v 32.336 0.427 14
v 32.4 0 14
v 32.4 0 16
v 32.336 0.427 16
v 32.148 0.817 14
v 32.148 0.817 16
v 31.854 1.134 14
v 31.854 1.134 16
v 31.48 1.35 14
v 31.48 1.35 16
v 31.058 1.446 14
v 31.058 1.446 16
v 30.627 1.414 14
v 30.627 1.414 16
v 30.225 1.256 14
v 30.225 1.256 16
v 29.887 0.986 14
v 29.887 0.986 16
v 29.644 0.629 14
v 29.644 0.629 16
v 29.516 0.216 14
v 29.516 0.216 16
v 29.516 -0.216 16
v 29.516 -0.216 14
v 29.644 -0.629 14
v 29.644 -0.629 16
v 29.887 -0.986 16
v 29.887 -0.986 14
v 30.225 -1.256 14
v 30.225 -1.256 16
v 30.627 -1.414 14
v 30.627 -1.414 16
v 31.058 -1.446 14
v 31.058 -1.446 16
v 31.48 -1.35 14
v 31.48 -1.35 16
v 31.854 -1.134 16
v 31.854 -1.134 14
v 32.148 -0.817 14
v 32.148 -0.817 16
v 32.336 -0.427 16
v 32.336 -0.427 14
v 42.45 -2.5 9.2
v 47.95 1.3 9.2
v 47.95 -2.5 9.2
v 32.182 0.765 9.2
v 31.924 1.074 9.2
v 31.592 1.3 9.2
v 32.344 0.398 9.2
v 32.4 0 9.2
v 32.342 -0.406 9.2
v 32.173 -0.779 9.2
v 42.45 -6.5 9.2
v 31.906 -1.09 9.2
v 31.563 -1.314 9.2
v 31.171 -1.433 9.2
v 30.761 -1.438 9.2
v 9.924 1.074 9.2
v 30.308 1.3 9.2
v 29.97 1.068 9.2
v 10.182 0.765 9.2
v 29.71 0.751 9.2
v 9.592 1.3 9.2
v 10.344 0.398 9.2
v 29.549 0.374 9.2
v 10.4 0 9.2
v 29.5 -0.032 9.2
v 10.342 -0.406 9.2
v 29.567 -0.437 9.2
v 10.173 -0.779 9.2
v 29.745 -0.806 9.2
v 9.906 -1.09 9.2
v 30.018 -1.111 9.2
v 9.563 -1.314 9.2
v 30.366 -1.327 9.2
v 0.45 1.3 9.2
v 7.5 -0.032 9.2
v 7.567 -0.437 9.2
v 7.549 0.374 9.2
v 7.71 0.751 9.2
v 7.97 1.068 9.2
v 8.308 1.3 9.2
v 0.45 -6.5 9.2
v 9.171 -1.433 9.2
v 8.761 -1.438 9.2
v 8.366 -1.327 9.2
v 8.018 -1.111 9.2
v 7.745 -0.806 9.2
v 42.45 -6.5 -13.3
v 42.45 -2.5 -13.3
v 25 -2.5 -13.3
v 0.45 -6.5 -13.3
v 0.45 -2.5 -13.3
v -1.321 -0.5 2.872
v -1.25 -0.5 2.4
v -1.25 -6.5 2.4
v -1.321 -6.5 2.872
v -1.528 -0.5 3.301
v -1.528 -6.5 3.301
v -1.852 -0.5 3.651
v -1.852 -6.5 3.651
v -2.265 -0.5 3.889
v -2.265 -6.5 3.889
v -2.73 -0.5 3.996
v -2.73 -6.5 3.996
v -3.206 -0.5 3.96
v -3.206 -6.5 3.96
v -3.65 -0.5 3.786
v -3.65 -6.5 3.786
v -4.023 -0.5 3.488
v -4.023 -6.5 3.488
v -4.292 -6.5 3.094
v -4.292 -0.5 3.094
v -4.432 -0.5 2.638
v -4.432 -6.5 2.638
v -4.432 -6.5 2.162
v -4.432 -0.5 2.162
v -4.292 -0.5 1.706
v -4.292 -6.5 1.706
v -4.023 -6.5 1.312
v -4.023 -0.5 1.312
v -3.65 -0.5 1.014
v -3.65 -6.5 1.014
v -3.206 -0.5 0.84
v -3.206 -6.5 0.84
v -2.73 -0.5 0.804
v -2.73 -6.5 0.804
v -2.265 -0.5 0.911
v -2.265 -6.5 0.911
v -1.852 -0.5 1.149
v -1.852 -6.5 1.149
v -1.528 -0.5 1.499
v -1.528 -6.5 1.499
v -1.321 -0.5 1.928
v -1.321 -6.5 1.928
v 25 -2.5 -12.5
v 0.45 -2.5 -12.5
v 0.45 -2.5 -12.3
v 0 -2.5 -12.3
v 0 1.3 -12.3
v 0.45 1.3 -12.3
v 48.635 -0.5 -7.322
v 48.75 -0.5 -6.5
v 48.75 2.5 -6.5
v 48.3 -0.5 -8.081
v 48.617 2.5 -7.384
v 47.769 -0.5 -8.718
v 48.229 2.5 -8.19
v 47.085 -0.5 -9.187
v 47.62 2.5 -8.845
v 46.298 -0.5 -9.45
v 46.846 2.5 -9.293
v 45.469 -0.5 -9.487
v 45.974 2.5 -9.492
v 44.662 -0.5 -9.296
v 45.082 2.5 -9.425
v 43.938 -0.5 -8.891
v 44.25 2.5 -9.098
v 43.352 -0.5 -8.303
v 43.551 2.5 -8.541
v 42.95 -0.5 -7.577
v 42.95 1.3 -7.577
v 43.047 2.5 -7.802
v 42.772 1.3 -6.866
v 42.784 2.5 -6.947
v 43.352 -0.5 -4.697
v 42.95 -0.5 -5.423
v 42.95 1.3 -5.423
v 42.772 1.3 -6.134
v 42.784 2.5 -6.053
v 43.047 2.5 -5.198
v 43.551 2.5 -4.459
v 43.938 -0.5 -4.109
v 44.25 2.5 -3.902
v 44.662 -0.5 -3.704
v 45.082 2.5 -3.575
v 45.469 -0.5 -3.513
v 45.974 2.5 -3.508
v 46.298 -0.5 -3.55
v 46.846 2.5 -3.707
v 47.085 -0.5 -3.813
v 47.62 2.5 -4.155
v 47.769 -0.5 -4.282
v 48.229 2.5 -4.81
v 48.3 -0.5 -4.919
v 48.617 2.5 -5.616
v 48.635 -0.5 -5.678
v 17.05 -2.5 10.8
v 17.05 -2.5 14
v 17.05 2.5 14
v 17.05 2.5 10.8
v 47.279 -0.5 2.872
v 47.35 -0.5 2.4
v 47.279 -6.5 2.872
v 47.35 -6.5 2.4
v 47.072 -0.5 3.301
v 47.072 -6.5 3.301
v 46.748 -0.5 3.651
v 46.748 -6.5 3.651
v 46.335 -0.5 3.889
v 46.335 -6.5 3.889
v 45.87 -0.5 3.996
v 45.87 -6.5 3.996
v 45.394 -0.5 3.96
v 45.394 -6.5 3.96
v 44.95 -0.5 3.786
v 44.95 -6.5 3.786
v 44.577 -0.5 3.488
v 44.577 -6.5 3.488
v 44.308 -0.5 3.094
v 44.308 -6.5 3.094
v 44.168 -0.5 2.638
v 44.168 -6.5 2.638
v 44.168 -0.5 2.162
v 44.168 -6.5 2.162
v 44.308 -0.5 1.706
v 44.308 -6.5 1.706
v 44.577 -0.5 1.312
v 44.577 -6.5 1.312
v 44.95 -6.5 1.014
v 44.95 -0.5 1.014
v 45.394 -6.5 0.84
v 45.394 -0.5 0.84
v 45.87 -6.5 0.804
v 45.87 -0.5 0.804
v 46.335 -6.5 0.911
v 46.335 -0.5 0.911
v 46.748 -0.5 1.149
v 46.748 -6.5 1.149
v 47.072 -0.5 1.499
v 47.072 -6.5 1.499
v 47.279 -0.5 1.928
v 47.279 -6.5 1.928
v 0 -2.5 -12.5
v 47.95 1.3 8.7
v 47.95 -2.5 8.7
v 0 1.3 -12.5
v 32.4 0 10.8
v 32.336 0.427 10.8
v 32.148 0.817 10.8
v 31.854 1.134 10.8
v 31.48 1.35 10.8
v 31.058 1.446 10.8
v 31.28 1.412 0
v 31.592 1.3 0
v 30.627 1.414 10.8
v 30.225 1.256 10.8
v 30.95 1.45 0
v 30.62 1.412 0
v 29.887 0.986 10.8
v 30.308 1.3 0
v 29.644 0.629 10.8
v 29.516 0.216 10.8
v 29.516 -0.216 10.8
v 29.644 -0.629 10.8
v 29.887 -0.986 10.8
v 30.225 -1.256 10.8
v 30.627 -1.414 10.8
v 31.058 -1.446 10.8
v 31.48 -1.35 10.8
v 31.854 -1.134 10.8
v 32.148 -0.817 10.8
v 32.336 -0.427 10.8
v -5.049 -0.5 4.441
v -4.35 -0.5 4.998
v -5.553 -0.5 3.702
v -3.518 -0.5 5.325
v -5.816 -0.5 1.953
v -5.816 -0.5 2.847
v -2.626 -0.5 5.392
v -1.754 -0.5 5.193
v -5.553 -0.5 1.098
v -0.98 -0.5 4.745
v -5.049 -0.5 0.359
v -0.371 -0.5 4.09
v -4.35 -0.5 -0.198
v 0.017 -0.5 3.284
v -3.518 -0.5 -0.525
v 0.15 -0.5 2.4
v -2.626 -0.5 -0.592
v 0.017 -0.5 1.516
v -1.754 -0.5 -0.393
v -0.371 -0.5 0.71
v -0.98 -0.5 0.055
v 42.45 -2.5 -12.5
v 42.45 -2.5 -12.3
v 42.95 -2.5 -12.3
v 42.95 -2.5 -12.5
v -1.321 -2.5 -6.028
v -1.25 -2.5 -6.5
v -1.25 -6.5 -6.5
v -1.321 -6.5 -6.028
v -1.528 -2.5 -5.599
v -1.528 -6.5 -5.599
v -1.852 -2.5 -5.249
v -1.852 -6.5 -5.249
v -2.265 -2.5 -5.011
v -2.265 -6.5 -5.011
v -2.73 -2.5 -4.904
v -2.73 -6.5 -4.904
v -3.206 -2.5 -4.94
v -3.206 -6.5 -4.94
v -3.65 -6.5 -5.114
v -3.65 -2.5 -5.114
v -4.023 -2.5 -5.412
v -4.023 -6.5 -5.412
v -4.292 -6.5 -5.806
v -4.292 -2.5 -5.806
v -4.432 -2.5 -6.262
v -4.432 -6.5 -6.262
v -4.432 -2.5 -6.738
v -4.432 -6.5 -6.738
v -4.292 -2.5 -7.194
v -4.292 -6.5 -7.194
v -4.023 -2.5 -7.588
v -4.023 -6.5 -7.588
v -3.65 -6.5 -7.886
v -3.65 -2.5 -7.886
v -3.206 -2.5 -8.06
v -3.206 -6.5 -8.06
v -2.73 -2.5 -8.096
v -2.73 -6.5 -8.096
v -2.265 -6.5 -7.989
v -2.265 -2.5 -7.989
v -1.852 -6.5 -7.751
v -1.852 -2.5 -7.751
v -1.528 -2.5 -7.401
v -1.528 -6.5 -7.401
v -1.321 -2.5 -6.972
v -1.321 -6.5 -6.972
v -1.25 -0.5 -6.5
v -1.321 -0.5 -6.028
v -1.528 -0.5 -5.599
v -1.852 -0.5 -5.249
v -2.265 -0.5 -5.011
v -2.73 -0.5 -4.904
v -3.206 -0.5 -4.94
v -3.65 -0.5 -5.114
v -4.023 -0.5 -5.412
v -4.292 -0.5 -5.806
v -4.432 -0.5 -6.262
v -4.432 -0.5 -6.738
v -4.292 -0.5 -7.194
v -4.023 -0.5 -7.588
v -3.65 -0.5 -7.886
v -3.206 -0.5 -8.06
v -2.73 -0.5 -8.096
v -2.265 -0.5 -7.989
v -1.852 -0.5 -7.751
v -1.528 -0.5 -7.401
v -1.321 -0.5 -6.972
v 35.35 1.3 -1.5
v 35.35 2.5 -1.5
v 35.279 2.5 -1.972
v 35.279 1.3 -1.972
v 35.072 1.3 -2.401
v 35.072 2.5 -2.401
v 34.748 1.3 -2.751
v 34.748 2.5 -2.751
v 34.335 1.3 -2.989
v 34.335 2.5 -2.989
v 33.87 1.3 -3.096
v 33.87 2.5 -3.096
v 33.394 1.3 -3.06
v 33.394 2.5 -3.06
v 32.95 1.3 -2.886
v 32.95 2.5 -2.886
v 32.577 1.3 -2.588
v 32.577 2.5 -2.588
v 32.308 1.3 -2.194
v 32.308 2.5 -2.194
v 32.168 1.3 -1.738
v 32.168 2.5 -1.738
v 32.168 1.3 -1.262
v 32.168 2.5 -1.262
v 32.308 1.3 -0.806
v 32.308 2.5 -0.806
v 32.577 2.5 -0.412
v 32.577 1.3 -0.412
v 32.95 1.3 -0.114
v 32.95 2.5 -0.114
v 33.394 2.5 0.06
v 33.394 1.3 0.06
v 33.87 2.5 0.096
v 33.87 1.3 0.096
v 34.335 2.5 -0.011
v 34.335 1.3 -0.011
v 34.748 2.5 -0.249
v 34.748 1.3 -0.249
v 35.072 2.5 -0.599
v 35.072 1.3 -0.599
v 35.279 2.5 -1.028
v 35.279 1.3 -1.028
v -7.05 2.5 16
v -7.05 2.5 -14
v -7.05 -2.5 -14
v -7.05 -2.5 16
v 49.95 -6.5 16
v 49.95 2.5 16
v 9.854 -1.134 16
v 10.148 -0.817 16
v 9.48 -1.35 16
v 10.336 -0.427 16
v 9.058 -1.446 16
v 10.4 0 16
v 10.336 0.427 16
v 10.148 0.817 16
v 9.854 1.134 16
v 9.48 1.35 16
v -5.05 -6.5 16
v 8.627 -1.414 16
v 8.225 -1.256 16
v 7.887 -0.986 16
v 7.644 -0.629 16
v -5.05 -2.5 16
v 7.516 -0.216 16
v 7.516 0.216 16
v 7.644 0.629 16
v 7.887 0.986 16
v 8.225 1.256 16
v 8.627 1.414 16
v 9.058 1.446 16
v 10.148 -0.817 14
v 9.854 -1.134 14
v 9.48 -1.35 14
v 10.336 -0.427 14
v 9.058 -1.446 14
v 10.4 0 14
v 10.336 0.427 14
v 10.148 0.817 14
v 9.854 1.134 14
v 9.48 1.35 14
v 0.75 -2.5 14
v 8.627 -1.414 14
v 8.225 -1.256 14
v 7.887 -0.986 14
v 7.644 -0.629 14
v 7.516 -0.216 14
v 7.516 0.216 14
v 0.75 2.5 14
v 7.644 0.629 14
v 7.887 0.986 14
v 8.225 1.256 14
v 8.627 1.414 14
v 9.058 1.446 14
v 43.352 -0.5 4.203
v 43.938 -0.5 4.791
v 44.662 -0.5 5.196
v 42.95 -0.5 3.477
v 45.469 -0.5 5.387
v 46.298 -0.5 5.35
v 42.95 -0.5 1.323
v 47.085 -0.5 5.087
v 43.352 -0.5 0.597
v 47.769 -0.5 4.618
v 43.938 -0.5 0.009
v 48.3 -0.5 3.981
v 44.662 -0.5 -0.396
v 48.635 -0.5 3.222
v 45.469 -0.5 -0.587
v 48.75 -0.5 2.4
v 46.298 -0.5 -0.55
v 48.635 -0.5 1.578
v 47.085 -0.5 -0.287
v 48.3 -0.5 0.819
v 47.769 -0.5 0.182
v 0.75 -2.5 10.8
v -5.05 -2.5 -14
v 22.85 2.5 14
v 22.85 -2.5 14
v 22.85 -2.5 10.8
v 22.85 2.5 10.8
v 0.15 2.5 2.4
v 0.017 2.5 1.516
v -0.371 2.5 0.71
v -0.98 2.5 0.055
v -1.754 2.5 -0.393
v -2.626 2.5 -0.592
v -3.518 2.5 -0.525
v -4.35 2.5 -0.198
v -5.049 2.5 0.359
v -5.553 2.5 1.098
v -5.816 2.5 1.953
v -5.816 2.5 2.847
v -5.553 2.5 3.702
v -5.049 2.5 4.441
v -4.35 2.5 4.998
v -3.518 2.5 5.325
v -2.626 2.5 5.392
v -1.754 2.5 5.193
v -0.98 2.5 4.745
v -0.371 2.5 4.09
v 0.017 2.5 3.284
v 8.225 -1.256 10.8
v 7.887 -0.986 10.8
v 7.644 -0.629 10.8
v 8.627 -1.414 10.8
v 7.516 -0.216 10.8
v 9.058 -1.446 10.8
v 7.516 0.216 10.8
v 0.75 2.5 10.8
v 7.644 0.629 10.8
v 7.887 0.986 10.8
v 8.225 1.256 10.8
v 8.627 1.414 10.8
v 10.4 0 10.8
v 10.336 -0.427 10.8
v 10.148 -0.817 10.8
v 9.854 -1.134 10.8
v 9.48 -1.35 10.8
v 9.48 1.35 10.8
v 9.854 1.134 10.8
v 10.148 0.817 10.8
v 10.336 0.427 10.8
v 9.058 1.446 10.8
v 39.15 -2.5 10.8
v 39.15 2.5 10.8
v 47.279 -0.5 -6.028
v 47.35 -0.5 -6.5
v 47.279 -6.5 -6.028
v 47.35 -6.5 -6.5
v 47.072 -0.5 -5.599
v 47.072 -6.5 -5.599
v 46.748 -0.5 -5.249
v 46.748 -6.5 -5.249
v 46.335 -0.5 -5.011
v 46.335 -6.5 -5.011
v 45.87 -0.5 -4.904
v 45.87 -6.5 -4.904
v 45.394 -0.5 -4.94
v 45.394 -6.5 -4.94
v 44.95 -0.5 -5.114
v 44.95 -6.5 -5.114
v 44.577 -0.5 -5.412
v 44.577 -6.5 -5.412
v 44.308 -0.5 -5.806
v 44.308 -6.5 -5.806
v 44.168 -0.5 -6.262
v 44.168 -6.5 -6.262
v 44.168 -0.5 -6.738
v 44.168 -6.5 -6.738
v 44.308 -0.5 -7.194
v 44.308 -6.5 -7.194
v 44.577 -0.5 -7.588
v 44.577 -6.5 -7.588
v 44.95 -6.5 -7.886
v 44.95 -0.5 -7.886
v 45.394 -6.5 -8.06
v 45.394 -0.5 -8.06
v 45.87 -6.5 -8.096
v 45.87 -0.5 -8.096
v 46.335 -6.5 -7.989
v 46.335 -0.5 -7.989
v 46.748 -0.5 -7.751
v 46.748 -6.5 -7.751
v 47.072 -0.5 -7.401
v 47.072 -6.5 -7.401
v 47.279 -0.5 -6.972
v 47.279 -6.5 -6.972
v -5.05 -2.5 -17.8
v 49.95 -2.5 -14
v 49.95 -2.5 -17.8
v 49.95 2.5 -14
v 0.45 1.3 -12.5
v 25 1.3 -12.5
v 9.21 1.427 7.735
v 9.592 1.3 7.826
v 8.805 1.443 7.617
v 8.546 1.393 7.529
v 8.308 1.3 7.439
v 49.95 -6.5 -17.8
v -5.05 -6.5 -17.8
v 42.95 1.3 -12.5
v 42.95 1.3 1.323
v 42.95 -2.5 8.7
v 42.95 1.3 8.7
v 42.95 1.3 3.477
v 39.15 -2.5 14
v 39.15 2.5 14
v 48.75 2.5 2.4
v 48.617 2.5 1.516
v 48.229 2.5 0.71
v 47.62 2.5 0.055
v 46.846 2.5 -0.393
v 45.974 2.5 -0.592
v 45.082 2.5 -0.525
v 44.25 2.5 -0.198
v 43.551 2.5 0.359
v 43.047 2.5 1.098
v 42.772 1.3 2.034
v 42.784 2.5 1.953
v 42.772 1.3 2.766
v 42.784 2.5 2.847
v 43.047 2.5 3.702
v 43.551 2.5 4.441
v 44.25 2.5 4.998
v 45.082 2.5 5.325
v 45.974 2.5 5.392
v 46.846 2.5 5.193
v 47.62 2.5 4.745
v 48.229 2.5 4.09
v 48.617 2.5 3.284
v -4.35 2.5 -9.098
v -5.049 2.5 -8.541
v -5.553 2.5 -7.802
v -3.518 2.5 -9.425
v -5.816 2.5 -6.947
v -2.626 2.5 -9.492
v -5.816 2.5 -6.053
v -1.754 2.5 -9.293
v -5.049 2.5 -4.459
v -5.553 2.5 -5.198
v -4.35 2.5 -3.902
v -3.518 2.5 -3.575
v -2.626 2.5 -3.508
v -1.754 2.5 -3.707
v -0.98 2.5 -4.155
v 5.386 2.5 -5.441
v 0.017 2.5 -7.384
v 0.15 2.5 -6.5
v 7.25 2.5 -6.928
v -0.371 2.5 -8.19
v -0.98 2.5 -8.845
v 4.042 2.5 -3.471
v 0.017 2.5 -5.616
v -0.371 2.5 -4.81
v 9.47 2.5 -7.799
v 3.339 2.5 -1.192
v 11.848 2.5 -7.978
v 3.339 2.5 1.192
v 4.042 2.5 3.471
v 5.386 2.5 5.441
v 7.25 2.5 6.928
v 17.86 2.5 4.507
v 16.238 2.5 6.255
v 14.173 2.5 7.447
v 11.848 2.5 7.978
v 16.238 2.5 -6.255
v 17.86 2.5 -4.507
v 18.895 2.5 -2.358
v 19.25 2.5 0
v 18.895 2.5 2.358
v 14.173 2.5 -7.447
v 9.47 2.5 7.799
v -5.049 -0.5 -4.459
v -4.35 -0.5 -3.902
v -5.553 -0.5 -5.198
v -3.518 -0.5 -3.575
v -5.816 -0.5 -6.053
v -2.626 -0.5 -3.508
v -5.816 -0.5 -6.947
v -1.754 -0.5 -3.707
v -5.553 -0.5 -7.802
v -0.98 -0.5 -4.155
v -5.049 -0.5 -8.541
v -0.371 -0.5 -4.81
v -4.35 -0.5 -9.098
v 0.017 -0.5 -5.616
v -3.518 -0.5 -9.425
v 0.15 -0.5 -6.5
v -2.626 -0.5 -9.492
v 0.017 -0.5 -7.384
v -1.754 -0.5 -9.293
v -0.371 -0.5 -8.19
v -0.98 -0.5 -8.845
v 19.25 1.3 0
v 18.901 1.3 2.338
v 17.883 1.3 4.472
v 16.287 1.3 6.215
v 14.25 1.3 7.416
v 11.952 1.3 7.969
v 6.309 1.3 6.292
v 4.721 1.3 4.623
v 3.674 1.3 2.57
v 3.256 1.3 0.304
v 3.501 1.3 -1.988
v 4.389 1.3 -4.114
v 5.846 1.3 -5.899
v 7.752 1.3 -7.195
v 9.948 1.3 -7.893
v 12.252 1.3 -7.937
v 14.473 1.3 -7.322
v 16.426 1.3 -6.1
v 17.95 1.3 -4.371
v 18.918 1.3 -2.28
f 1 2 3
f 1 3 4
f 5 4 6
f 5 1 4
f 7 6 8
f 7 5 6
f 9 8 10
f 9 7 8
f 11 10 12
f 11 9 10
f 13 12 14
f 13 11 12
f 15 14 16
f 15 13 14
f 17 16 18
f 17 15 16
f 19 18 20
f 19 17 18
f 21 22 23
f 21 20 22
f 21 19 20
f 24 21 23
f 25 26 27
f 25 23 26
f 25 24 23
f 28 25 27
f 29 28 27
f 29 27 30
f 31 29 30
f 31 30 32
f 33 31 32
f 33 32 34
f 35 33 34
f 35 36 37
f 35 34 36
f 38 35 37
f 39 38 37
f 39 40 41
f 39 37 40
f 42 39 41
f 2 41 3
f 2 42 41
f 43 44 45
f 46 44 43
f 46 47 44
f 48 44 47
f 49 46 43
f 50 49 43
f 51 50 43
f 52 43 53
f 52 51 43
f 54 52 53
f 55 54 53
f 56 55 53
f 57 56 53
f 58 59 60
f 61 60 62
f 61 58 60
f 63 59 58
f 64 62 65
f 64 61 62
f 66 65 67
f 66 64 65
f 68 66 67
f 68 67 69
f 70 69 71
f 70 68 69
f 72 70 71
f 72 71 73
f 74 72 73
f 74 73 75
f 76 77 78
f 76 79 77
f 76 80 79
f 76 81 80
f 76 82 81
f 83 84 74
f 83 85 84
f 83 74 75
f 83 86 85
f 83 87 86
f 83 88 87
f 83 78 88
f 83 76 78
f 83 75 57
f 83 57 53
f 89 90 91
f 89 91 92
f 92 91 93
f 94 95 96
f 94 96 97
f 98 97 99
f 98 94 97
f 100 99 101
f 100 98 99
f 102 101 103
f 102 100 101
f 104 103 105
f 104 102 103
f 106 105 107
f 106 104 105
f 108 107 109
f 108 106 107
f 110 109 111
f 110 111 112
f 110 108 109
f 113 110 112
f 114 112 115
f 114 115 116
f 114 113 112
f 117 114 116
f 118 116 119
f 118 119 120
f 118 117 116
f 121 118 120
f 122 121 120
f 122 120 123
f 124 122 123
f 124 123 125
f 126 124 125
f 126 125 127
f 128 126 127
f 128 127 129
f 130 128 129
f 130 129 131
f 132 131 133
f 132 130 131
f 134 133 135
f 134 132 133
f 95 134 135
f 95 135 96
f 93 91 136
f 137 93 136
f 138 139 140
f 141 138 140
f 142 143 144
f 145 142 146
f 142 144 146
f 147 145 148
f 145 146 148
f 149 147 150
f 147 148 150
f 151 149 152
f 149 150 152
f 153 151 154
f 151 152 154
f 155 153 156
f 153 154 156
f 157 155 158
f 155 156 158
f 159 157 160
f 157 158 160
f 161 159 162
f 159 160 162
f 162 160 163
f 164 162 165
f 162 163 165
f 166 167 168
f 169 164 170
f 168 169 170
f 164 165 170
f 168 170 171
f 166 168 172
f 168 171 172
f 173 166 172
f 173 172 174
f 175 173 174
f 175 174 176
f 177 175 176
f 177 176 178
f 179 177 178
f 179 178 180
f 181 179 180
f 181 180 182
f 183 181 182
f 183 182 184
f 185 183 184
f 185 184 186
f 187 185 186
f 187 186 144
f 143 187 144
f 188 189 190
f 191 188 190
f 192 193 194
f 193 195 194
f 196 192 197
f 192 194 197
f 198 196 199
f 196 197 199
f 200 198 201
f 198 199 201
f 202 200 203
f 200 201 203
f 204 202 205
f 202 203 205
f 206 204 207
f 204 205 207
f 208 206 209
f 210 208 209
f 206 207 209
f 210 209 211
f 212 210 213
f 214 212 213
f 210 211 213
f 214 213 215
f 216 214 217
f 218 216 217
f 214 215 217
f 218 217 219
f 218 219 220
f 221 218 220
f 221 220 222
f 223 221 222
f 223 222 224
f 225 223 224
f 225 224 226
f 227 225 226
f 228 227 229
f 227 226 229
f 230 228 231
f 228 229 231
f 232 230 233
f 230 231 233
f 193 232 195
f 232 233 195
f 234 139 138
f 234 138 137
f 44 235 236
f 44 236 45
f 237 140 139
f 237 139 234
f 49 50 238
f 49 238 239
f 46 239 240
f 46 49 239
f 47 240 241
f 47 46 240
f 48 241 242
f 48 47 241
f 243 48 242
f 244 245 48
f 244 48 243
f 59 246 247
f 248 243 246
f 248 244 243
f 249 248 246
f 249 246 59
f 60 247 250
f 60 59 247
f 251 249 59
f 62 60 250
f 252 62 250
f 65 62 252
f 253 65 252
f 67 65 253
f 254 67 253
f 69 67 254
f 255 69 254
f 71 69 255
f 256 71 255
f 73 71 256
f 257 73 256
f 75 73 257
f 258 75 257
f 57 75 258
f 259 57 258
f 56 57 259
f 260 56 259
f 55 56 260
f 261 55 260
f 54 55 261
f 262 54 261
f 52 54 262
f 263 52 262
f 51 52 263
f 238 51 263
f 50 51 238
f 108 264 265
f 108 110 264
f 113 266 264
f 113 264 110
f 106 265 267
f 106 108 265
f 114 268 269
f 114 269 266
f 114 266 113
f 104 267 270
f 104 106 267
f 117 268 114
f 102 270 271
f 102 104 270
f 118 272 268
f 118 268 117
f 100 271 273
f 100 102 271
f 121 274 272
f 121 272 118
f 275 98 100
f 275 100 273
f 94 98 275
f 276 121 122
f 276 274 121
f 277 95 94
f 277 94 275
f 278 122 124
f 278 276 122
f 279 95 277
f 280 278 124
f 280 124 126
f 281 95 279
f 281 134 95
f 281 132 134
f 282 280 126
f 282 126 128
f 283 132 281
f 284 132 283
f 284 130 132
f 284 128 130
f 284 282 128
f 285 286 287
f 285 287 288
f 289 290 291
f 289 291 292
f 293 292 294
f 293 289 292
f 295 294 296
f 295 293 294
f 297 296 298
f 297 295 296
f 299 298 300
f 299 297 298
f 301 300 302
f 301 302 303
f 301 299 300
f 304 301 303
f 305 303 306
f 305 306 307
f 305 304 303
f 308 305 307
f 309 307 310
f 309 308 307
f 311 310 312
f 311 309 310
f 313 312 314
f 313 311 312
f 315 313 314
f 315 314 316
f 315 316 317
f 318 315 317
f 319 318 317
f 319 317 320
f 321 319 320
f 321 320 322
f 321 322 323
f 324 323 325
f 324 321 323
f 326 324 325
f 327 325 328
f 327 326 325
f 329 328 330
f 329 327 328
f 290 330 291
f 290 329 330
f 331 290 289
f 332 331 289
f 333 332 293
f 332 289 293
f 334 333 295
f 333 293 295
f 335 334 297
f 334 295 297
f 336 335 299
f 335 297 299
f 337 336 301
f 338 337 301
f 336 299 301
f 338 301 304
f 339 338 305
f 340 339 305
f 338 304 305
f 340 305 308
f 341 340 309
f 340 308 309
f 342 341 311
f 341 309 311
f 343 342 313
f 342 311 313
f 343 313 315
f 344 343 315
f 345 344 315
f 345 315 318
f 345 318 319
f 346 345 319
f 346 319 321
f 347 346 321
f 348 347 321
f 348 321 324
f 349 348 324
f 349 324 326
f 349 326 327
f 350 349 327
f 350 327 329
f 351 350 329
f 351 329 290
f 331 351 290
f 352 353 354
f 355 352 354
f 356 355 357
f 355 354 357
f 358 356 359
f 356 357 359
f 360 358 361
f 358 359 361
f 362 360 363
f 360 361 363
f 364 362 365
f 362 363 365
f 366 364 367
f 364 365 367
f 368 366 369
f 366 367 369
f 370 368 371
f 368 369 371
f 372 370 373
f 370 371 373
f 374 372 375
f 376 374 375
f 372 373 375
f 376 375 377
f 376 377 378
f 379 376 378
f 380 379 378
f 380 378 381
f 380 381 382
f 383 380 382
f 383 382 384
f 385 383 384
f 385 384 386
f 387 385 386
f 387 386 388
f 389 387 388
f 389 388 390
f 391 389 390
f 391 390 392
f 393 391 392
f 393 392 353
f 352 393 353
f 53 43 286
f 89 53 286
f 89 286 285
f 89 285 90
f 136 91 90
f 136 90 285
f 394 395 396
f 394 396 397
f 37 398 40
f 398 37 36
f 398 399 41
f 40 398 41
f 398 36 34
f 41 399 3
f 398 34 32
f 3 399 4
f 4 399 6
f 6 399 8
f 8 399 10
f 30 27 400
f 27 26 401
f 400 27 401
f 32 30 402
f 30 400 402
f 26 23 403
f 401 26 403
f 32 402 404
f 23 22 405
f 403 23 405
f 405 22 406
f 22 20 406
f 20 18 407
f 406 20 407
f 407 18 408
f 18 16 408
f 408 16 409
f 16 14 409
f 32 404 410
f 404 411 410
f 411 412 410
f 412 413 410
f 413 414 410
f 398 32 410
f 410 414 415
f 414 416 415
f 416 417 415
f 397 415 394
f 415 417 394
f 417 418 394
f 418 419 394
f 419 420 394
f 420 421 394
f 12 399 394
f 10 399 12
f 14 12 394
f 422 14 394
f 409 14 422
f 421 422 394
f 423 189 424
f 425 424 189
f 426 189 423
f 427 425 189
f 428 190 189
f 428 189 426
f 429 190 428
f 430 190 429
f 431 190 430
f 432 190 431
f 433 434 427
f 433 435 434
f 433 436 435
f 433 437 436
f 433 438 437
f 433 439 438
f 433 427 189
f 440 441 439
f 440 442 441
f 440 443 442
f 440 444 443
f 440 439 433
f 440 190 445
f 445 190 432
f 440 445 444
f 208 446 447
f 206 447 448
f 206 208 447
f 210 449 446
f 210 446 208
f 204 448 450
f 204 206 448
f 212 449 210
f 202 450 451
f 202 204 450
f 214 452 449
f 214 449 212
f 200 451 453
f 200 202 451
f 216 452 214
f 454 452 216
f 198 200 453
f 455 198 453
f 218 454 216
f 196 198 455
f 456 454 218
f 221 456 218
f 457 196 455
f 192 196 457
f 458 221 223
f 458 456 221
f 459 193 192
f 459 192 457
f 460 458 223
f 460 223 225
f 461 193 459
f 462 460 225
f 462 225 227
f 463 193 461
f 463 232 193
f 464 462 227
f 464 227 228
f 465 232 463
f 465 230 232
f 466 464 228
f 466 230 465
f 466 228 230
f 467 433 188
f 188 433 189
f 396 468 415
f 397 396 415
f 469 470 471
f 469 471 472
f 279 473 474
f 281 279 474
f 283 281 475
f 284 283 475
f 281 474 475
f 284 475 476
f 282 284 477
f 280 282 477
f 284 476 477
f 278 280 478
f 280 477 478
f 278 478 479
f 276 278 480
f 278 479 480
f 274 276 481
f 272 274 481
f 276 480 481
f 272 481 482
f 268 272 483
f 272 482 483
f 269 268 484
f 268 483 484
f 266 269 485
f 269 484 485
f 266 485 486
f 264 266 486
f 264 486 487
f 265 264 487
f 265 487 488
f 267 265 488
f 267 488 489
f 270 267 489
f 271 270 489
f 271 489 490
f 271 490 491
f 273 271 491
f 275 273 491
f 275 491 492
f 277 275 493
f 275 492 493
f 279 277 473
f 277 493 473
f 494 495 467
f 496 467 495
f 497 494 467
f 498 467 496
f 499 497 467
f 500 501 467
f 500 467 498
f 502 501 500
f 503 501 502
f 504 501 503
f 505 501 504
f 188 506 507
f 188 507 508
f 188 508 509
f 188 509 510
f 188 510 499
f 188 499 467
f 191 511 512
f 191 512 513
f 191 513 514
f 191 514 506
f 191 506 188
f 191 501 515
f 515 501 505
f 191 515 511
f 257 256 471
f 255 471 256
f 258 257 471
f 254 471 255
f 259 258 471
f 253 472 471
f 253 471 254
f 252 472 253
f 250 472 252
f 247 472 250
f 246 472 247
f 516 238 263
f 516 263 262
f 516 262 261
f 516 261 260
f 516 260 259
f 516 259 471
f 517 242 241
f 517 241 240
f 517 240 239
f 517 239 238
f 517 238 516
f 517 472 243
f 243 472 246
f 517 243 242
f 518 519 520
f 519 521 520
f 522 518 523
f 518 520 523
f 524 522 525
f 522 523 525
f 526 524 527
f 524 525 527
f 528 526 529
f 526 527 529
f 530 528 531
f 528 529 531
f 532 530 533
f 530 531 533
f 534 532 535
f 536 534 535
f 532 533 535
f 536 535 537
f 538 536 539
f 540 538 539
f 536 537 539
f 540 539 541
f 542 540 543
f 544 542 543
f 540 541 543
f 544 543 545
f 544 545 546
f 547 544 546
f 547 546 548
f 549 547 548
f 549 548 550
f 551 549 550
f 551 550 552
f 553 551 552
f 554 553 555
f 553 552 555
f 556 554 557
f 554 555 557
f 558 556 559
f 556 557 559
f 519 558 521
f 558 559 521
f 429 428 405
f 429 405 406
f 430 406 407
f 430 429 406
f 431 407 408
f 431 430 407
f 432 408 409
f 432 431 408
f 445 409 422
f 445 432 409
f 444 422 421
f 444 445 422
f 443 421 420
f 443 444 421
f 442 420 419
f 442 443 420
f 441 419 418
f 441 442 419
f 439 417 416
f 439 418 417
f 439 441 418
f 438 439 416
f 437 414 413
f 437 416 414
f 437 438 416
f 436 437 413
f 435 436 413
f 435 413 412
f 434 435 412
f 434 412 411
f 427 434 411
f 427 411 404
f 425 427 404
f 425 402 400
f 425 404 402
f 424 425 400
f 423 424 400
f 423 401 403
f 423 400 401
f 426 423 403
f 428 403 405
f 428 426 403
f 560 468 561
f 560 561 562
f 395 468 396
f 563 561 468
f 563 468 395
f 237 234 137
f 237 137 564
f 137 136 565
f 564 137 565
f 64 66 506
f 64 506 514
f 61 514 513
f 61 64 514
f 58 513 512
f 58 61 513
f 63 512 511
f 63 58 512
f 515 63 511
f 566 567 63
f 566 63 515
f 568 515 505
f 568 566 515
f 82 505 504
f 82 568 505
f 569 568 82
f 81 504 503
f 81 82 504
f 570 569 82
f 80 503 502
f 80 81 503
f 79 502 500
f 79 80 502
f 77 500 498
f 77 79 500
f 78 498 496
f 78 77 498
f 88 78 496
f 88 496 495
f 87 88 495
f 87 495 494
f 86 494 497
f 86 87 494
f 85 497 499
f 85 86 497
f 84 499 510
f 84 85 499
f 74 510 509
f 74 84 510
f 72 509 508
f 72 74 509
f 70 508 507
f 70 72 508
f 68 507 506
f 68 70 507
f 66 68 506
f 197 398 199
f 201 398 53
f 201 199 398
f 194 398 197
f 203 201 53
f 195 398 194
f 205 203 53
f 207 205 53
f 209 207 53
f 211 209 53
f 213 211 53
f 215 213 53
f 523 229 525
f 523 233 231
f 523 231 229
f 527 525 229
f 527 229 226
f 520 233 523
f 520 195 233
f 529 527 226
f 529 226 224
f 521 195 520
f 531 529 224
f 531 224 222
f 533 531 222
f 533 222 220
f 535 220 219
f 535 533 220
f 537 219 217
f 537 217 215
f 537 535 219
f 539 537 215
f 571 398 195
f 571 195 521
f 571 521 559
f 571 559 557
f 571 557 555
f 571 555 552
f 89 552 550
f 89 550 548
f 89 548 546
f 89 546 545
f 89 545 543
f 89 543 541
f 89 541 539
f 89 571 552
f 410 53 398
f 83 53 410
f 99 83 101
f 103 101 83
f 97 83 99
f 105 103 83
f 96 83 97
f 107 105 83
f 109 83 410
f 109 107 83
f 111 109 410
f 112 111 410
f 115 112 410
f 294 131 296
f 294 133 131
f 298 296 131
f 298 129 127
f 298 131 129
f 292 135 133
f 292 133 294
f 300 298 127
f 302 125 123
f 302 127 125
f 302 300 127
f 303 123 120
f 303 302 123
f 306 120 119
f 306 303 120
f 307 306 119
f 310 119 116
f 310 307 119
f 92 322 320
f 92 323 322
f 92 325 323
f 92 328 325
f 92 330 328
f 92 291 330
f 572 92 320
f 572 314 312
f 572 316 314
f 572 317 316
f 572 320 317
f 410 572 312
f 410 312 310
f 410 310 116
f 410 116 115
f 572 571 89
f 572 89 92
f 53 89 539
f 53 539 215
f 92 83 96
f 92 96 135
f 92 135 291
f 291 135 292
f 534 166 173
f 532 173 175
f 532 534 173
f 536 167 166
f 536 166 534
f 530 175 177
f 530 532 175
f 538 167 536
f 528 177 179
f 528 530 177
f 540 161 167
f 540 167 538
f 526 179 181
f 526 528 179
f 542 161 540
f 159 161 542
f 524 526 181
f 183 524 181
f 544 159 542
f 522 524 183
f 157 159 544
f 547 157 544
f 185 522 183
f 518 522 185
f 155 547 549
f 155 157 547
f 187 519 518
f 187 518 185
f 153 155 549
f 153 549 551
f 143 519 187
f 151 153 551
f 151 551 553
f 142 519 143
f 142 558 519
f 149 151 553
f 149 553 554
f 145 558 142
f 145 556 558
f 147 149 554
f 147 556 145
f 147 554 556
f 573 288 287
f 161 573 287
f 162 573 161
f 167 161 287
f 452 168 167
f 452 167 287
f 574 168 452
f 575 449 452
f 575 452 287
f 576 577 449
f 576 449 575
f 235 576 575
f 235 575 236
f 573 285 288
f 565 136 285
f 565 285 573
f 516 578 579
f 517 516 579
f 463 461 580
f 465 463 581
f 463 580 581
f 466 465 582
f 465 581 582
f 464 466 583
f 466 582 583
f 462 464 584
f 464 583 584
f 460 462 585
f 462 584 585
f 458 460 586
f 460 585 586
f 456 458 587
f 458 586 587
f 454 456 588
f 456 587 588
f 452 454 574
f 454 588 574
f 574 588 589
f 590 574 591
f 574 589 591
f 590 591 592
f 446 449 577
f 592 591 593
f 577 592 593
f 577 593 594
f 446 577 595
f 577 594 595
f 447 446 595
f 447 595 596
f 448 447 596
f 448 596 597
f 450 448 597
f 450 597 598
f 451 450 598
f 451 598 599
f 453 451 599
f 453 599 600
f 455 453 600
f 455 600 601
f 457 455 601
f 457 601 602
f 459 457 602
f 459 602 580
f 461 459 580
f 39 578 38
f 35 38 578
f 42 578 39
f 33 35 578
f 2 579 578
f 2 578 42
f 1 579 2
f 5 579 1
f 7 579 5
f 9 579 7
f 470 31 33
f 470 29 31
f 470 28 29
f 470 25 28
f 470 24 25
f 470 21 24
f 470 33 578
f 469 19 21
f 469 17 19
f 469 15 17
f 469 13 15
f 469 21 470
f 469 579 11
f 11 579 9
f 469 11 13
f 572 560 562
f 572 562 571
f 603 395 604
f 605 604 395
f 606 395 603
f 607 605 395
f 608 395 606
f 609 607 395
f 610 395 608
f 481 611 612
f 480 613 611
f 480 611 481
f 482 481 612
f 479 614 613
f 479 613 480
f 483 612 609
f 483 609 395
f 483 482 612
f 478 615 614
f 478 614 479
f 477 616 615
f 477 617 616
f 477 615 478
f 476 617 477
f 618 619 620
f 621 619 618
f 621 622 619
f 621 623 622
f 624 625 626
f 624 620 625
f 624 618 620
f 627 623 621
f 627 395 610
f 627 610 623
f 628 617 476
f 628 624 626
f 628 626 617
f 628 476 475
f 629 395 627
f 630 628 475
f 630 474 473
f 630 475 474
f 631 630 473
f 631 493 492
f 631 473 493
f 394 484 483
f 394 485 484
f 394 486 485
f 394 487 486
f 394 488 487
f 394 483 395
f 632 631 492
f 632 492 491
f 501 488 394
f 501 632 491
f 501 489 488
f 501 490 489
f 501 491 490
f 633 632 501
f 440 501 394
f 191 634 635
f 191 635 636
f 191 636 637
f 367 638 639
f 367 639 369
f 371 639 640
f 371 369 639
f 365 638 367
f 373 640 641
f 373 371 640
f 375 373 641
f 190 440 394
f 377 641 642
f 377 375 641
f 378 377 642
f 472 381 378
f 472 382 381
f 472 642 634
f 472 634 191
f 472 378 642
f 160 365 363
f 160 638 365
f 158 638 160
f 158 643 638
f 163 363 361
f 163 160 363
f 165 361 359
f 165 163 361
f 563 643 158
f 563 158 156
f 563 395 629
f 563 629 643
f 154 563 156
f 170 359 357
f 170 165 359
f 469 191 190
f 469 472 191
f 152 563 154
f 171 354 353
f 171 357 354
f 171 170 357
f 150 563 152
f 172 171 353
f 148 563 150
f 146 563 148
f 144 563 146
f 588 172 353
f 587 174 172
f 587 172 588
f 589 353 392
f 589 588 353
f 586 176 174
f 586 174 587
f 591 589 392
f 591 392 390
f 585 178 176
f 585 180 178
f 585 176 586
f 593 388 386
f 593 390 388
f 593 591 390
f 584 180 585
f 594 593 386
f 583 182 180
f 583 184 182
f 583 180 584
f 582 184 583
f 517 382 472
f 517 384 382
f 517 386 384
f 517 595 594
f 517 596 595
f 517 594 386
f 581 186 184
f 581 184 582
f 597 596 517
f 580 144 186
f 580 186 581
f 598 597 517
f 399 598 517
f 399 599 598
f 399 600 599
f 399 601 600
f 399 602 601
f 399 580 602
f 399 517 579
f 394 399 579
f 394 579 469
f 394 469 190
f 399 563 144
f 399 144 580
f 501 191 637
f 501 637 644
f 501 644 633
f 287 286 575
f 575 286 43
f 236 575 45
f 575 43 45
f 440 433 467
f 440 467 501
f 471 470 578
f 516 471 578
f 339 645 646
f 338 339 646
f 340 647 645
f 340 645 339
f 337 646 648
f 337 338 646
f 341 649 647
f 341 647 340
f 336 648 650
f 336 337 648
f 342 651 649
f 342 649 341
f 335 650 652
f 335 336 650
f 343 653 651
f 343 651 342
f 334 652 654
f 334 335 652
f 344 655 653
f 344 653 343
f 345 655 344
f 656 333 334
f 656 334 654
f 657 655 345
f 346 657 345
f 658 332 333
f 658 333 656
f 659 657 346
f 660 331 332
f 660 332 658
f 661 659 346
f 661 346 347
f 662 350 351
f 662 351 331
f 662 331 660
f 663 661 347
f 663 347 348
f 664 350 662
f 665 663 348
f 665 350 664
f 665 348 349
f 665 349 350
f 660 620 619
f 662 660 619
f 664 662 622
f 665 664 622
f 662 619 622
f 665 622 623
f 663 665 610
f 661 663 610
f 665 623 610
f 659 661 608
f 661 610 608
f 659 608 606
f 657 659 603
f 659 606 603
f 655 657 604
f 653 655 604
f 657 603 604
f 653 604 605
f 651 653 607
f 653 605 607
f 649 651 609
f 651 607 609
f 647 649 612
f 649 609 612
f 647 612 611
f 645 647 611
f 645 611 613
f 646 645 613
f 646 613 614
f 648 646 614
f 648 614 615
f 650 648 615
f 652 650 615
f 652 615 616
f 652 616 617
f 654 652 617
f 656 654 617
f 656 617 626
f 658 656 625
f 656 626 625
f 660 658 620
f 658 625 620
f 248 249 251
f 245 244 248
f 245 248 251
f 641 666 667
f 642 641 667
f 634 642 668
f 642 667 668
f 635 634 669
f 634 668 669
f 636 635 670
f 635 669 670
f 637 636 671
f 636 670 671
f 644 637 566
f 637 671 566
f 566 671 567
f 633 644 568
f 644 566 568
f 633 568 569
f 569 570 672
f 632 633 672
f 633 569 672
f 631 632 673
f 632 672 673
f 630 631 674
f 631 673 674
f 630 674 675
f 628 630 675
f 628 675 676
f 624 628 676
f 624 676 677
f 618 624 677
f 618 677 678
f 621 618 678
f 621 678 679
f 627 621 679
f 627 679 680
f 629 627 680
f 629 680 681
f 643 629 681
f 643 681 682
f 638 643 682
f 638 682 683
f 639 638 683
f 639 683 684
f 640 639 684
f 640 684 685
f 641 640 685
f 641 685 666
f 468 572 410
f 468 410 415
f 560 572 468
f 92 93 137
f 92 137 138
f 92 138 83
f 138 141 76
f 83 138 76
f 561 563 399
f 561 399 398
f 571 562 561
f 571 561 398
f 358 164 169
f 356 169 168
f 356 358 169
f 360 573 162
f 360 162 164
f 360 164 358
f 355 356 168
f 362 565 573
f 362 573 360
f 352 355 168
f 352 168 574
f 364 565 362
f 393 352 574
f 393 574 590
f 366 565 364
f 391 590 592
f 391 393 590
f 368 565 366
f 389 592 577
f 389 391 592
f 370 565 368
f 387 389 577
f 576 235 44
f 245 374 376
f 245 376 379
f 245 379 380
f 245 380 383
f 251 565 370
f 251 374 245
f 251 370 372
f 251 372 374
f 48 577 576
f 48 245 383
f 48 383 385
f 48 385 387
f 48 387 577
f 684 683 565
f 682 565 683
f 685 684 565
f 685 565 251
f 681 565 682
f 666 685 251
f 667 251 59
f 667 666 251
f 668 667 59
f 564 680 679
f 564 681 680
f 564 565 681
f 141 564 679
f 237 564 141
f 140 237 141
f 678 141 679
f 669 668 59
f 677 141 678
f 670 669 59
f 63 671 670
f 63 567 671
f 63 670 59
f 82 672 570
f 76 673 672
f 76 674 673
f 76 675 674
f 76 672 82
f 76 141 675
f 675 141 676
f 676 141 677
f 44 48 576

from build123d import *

# Parameters (mm, degrees)
SKETCH1_W                = 50
SKETCH1_H                = 25
SKETCH1_R                = 4.5
SKETCH1_R_2              = 1.3
BOSS_EXTRUDE2_DEPTH      = 2.5
SKETCH5_W                = 50
SKETCH5_H                = 12
BOSS_EXTRUDE3_DEPTH      = 1.5
SKETCH6_W                = 50
SKETCH6_H                = 26.5
BOSS_EXTRUDE4_DEPTH      = 1.5
SKETCH7_R                = 1.3
CUT_EXTRUDE3_DEPTH       = 23
SKETCH8_R                = 1.6
BOSS_EXTRUDE5_DEPTH      = 4
SKETCH8_3_R              = 8
CUT_EXTRUDE4_DEPTH       = 5
SKETCH9_W                = 24.55
SKETCH9_H                = 21.7
CUT_EXTRUDE5_DEPTH       = 3.8
BOSS_EXTRUDE6_DEPTH      = 22.95
BOSS_EXTRUDE7_DEPTH      = 2
SKETCH8_4_R              = 1.6
CUT_EXTRUDE6_DEPTH       = 5
SKETCH12_W               = 7
SKETCH12_H               = 21
BOSS_EXTRUDE8_DEPTH      = 7.8
SKETCH13_W               = 0.7
SKETCH13_H               = 9
CUT_EXTRUDE7_DEPTH       = 50.95
CUT_EXTRUDE7_DEPTH_BACK  = 26
SKETCH14_W               = 26.5
SKETCH14_H               = 8.5
CUT_EXTRUDE8_DEPTH       = 50.95
CUT_EXTRUDE8_DEPTH_BACK  = 26
SKETCH15_R               = 3
CUT_EXTRUDE9_DEPTH       = 1
CUT_EXTRUDE9_DEPTH_BACK  = 3
SKETCH8_5_R              = 1.6
CUT_EXTRUDE10_DEPTH      = 5
CUT_EXTRUDE10_DEPTH_BACK = 6
SKETCH16_W               = 16.3
SKETCH16_H               = 5
CUT_EXTRUDE11_DEPTH      = 3.2
SKETCH17_R               = 1.45
CUT_EXTRUDE12_DEPTH      = 13.2
SKETCH18_R               = 1.6
CUT_EXTRUDE13_DEPTH      = 3.2
SKETCH19_W               = 17.95
SKETCH19_H               = 5
CUT_EXTRUDE14_DEPTH      = 33.2
BOSS_EXTRUDE9_DEPTH      = 2
SKETCH21_W               = 1.5
SKETCH21_H               = 5
BOSS_EXTRUDE10_DEPTH     = 32.05
SKETCH23_W               = 0.2
SKETCH23_H               = 3.8
CUT_EXTRUDE15_DEPTH      = 42.95
SKETCH17_2_R             = 1.45
CUT_EXTRUDE16_DEPTH      = 20


with BuildPart() as part:
    # Sketch1 → Boss-Extrude2 (new body, symmetric)
    with BuildSketch(Plane(origin=(0, 0, 0), x_dir=(1, 0, 0), z_dir=(0, 1, 0))):
        Rectangle(SKETCH1_W, SKETCH1_H)
        with Locations((11.25, 0)):
            Circle(SKETCH1_R, mode=Mode.SUBTRACT)
        with Locations((-11.25, 0)):
            Circle(SKETCH1_R_2, mode=Mode.SUBTRACT)
    extrude(amount=BOSS_EXTRUDE2_DEPTH, both=True)

    # Sketch5 → Boss-Extrude3 (add, symmetric)
    with BuildSketch(Plane.XY.offset(12.5)):
        with Locations((0, 3.5)):
            Rectangle(SKETCH5_W, SKETCH5_H)
    extrude(amount=BOSS_EXTRUDE3_DEPTH, both=True)

    # Sketch6 → Boss-Extrude4 (add, symmetric)
    with BuildSketch(Plane(origin=(0, 9.5, 0), x_dir=(1, 0, 0), z_dir=(0, 1, 0))):
        with Locations((0, -0.75)):
            Rectangle(SKETCH6_W, SKETCH6_H)
    extrude(amount=BOSS_EXTRUDE4_DEPTH, both=True)

    # Sketch7 → Cut-Extrude3 (cut)
    with BuildSketch(Plane(origin=(0, 11, 0), x_dir=(1, 0, 0), z_dir=(0, 1, 0))):
        with Locations((-11.25, 0)):
            Circle(SKETCH7_R)
        with Locations((11.25, 0)):
            Circle(SKETCH7_R)
    extrude(amount=-CUT_EXTRUDE3_DEPTH, mode=Mode.SUBTRACT)

    # Sketch8 → Boss-Extrude5 (add)
    with BuildSketch(Plane.XZ.offset(2.5)):
        Polygon((47.95, 14.7), (-5.05, 14.7), (-5.05, 14), (25, 14), (25, 9.2), (42.45, 9.2), (42.45, -13.3), (0.45, -13.3), (0.45, -12.5), (-5.05, -12.5), (-5.05, -17.8), (47.95, -17.8), align=None)
        with Locations((45.75, -6.5)):
            Circle(SKETCH8_R, mode=Mode.SUBTRACT)
        with Locations((45.75, 2.4)):
            Circle(SKETCH8_R, mode=Mode.SUBTRACT)
        Polygon((25, 14), (-5.05, 14), (-5.05, -12.5), (0.45, -12.5), (0.45, 9.2), (25, 9.2), align=None)
        with Locations((-2.85, -6.5)):
            Circle(SKETCH8_R, mode=Mode.SUBTRACT)
        with Locations((-2.85, 2.4)):
            Circle(SKETCH8_R, mode=Mode.SUBTRACT)
    extrude(amount=BOSS_EXTRUDE5_DEPTH)

    # Sketch8<3> → Cut-Extrude4 (cut)
    with BuildSketch(Plane.XZ.offset(2.5)):
        with Locations((11.25, 0)):
            Circle(SKETCH8_3_R)
    extrude(amount=-CUT_EXTRUDE4_DEPTH, mode=Mode.SUBTRACT)

    # Sketch9 → Cut-Extrude5 (cut)
    with BuildSketch(Plane.XZ.offset(2.5)):
        with Locations((12.725, -1.65)):
            Rectangle(SKETCH9_W, SKETCH9_H)
    extrude(amount=-CUT_EXTRUDE5_DEPTH, mode=Mode.SUBTRACT)

    # Sketch10 → Boss-Extrude6 (add)
    with BuildSketch(Plane(origin=(25, 0, 0), x_dir=(0, 0, -1), z_dir=(1, 0, 0))):
        Polygon((-14.7, -2.5), (-14.7, 2.5), (14, 2.5), (14, -2.5), (12.3, -2.5), (12.3, 1.3), (-9.2, 1.3), (-9.2, -2.5), align=None)
    extrude(amount=BOSS_EXTRUDE6_DEPTH)

    # Sketch11 → Boss-Extrude7 (add)
    with BuildSketch(Plane(origin=(47.95, 0, 0), x_dir=(0, 0, -1), z_dir=(1, 0, 0))):
        Polygon((-14.7, 2.5), (14, 2.5), (14, -2.5), (17.8, -2.5), (17.8, -6.5), (-14.7, -6.5), align=None)
    extrude(amount=BOSS_EXTRUDE7_DEPTH)

    # Sketch8<4> → Cut-Extrude6 (cut)
    with BuildSketch(Plane.XZ.offset(2.5)):
        with Locations((45.75, -6.5)):
            Circle(SKETCH8_4_R)
        with Locations((45.75, 2.4)):
            Circle(SKETCH8_4_R)
        with Locations((-2.85, -6.5)):
            Circle(SKETCH8_4_R)
        with Locations((-2.85, 2.4)):
            Circle(SKETCH8_4_R)
    extrude(amount=-CUT_EXTRUDE6_DEPTH, mode=Mode.SUBTRACT)

    # Sketch12 → Boss-Extrude8 (add)
    with BuildSketch(Plane.XZ.offset(-1.3)):
        with Locations((46.45, -1.8)):
            Rectangle(SKETCH12_W, SKETCH12_H)
    extrude(amount=BOSS_EXTRUDE8_DEPTH)

    # Sketch13 → Cut-Extrude7 (cut, two sides)
    with BuildSketch(Plane(origin=(0, 0, 0), x_dir=(0, 0, -1), z_dir=(1, 0, 0))) as cut_extrude7_sk:
        with Locations((-14.35, -2)):
            Rectangle(SKETCH13_W, SKETCH13_H)
    extrude(amount=CUT_EXTRUDE7_DEPTH, mode=Mode.SUBTRACT)
    extrude(cut_extrude7_sk.sketch, amount=-CUT_EXTRUDE7_DEPTH_BACK, mode=Mode.SUBTRACT)

    # Sketch14 → Cut-Extrude8 (cut, two sides)
    with BuildSketch(Plane(origin=(0, 0, 0), x_dir=(0, 0, -1), z_dir=(1, 0, 0))) as cut_extrude8_sk:
        with Locations((-0.75, 6.75)):
            Rectangle(SKETCH14_W, SKETCH14_H)
    extrude(amount=CUT_EXTRUDE8_DEPTH, mode=Mode.SUBTRACT)
    extrude(cut_extrude8_sk.sketch, amount=-CUT_EXTRUDE8_DEPTH_BACK, mode=Mode.SUBTRACT)

    # Sketch15 → Cut-Extrude9 (cut, two sides)
    with BuildSketch(Plane(origin=(0, 2.5, 0), x_dir=(1, 0, 0), z_dir=(0, 1, 0))) as cut_extrude9_sk:
        with Locations((-2.85, 6.5)):
            Circle(SKETCH15_R)
        with Locations((-2.85, -2.4)):
            Circle(SKETCH15_R)
        with Locations((45.75, 6.5)):
            Circle(SKETCH15_R)
        with Locations((45.75, -2.4)):
            Circle(SKETCH15_R)
    extrude(amount=CUT_EXTRUDE9_DEPTH, mode=Mode.SUBTRACT)
    extrude(cut_extrude9_sk.sketch, amount=-CUT_EXTRUDE9_DEPTH_BACK, mode=Mode.SUBTRACT)

    # Sketch8<5> → Cut-Extrude10 (cut, two sides)
    with BuildSketch(Plane.XZ.offset(2.5)) as cut_extrude10_sk:
        with Locations((45.75, -6.5)):
            Circle(SKETCH8_5_R)
        with Locations((45.75, 2.4)):
            Circle(SKETCH8_5_R)
    extrude(amount=CUT_EXTRUDE10_DEPTH, mode=Mode.SUBTRACT)
    extrude(cut_extrude10_sk.sketch, amount=-CUT_EXTRUDE10_DEPTH_BACK, mode=Mode.SUBTRACT)

    # Sketch16 → Cut-Extrude11 (cut)
    with BuildSketch(Plane.XY.offset(14)):
        with Locations((8.9, 0)):
            Rectangle(SKETCH16_W, SKETCH16_H)
        with Locations((31, 0)):
            Rectangle(SKETCH16_W, SKETCH16_H)
    extrude(amount=-CUT_EXTRUDE11_DEPTH, mode=Mode.SUBTRACT)

    # Sketch17 → Cut-Extrude12 (cut)
    with BuildSketch(Plane.XY):
        with Locations((8.95, 0)):
            Circle(SKETCH17_R)
        with Locations((30.95, 0)):
            Circle(SKETCH17_R)
    extrude(amount=CUT_EXTRUDE12_DEPTH, mode=Mode.SUBTRACT)

    # Sketch18 → Cut-Extrude13 (cut)
    with BuildSketch(Plane(origin=(0, 2.5, 0), x_dir=(1, 0, 0), z_dir=(0, 1, 0))):
        with Locations((33.75, 1.5)):
            Circle(SKETCH18_R)
    extrude(amount=-CUT_EXTRUDE13_DEPTH, mode=Mode.SUBTRACT)

    # Sketch19 → Cut-Extrude14 (cut)
    with BuildSketch(Plane.XY.offset(14)):
        with Locations((-16.025, 0)):
            Rectangle(SKETCH19_W, SKETCH19_H)
    extrude(amount=-CUT_EXTRUDE14_DEPTH, mode=Mode.SUBTRACT)

    # Sketch20 → Boss-Extrude9 (add)
    with BuildSketch(Plane.XY.offset(14)):
        Polygon((-7.05, 2.5), (49.95, 2.5), (49.95, -6.5), (-5.05, -6.5), (-5.05, -2.5), (-7.05, -2.5), align=None)
    extrude(amount=BOSS_EXTRUDE9_DEPTH)

    # Sketch21 → Boss-Extrude10 (add)
    with BuildSketch(Plane.ZY.offset(-25)):
        with Locations((-13.25, 0)):
            Rectangle(SKETCH21_W, SKETCH21_H)
    extrude(amount=BOSS_EXTRUDE10_DEPTH)

    # Sketch23 → Cut-Extrude15 (cut)
    with BuildSketch(Plane(origin=(0, 0, 0), x_dir=(0, 0, -1), z_dir=(1, 0, 0))):
        with Locations((12.4, -0.6)):
            Rectangle(SKETCH23_W, SKETCH23_H)
    extrude(amount=CUT_EXTRUDE15_DEPTH, mode=Mode.SUBTRACT)

    # Sketch17<2> → Cut-Extrude16 (cut)
    with BuildSketch(Plane.XY):
        with Locations((8.95, 0)):
            Circle(SKETCH17_2_R)
        with Locations((30.95, 0)):
            Circle(SKETCH17_2_R)
    extrude(amount=CUT_EXTRUDE16_DEPTH, mode=Mode.SUBTRACT)


solid = part.part
